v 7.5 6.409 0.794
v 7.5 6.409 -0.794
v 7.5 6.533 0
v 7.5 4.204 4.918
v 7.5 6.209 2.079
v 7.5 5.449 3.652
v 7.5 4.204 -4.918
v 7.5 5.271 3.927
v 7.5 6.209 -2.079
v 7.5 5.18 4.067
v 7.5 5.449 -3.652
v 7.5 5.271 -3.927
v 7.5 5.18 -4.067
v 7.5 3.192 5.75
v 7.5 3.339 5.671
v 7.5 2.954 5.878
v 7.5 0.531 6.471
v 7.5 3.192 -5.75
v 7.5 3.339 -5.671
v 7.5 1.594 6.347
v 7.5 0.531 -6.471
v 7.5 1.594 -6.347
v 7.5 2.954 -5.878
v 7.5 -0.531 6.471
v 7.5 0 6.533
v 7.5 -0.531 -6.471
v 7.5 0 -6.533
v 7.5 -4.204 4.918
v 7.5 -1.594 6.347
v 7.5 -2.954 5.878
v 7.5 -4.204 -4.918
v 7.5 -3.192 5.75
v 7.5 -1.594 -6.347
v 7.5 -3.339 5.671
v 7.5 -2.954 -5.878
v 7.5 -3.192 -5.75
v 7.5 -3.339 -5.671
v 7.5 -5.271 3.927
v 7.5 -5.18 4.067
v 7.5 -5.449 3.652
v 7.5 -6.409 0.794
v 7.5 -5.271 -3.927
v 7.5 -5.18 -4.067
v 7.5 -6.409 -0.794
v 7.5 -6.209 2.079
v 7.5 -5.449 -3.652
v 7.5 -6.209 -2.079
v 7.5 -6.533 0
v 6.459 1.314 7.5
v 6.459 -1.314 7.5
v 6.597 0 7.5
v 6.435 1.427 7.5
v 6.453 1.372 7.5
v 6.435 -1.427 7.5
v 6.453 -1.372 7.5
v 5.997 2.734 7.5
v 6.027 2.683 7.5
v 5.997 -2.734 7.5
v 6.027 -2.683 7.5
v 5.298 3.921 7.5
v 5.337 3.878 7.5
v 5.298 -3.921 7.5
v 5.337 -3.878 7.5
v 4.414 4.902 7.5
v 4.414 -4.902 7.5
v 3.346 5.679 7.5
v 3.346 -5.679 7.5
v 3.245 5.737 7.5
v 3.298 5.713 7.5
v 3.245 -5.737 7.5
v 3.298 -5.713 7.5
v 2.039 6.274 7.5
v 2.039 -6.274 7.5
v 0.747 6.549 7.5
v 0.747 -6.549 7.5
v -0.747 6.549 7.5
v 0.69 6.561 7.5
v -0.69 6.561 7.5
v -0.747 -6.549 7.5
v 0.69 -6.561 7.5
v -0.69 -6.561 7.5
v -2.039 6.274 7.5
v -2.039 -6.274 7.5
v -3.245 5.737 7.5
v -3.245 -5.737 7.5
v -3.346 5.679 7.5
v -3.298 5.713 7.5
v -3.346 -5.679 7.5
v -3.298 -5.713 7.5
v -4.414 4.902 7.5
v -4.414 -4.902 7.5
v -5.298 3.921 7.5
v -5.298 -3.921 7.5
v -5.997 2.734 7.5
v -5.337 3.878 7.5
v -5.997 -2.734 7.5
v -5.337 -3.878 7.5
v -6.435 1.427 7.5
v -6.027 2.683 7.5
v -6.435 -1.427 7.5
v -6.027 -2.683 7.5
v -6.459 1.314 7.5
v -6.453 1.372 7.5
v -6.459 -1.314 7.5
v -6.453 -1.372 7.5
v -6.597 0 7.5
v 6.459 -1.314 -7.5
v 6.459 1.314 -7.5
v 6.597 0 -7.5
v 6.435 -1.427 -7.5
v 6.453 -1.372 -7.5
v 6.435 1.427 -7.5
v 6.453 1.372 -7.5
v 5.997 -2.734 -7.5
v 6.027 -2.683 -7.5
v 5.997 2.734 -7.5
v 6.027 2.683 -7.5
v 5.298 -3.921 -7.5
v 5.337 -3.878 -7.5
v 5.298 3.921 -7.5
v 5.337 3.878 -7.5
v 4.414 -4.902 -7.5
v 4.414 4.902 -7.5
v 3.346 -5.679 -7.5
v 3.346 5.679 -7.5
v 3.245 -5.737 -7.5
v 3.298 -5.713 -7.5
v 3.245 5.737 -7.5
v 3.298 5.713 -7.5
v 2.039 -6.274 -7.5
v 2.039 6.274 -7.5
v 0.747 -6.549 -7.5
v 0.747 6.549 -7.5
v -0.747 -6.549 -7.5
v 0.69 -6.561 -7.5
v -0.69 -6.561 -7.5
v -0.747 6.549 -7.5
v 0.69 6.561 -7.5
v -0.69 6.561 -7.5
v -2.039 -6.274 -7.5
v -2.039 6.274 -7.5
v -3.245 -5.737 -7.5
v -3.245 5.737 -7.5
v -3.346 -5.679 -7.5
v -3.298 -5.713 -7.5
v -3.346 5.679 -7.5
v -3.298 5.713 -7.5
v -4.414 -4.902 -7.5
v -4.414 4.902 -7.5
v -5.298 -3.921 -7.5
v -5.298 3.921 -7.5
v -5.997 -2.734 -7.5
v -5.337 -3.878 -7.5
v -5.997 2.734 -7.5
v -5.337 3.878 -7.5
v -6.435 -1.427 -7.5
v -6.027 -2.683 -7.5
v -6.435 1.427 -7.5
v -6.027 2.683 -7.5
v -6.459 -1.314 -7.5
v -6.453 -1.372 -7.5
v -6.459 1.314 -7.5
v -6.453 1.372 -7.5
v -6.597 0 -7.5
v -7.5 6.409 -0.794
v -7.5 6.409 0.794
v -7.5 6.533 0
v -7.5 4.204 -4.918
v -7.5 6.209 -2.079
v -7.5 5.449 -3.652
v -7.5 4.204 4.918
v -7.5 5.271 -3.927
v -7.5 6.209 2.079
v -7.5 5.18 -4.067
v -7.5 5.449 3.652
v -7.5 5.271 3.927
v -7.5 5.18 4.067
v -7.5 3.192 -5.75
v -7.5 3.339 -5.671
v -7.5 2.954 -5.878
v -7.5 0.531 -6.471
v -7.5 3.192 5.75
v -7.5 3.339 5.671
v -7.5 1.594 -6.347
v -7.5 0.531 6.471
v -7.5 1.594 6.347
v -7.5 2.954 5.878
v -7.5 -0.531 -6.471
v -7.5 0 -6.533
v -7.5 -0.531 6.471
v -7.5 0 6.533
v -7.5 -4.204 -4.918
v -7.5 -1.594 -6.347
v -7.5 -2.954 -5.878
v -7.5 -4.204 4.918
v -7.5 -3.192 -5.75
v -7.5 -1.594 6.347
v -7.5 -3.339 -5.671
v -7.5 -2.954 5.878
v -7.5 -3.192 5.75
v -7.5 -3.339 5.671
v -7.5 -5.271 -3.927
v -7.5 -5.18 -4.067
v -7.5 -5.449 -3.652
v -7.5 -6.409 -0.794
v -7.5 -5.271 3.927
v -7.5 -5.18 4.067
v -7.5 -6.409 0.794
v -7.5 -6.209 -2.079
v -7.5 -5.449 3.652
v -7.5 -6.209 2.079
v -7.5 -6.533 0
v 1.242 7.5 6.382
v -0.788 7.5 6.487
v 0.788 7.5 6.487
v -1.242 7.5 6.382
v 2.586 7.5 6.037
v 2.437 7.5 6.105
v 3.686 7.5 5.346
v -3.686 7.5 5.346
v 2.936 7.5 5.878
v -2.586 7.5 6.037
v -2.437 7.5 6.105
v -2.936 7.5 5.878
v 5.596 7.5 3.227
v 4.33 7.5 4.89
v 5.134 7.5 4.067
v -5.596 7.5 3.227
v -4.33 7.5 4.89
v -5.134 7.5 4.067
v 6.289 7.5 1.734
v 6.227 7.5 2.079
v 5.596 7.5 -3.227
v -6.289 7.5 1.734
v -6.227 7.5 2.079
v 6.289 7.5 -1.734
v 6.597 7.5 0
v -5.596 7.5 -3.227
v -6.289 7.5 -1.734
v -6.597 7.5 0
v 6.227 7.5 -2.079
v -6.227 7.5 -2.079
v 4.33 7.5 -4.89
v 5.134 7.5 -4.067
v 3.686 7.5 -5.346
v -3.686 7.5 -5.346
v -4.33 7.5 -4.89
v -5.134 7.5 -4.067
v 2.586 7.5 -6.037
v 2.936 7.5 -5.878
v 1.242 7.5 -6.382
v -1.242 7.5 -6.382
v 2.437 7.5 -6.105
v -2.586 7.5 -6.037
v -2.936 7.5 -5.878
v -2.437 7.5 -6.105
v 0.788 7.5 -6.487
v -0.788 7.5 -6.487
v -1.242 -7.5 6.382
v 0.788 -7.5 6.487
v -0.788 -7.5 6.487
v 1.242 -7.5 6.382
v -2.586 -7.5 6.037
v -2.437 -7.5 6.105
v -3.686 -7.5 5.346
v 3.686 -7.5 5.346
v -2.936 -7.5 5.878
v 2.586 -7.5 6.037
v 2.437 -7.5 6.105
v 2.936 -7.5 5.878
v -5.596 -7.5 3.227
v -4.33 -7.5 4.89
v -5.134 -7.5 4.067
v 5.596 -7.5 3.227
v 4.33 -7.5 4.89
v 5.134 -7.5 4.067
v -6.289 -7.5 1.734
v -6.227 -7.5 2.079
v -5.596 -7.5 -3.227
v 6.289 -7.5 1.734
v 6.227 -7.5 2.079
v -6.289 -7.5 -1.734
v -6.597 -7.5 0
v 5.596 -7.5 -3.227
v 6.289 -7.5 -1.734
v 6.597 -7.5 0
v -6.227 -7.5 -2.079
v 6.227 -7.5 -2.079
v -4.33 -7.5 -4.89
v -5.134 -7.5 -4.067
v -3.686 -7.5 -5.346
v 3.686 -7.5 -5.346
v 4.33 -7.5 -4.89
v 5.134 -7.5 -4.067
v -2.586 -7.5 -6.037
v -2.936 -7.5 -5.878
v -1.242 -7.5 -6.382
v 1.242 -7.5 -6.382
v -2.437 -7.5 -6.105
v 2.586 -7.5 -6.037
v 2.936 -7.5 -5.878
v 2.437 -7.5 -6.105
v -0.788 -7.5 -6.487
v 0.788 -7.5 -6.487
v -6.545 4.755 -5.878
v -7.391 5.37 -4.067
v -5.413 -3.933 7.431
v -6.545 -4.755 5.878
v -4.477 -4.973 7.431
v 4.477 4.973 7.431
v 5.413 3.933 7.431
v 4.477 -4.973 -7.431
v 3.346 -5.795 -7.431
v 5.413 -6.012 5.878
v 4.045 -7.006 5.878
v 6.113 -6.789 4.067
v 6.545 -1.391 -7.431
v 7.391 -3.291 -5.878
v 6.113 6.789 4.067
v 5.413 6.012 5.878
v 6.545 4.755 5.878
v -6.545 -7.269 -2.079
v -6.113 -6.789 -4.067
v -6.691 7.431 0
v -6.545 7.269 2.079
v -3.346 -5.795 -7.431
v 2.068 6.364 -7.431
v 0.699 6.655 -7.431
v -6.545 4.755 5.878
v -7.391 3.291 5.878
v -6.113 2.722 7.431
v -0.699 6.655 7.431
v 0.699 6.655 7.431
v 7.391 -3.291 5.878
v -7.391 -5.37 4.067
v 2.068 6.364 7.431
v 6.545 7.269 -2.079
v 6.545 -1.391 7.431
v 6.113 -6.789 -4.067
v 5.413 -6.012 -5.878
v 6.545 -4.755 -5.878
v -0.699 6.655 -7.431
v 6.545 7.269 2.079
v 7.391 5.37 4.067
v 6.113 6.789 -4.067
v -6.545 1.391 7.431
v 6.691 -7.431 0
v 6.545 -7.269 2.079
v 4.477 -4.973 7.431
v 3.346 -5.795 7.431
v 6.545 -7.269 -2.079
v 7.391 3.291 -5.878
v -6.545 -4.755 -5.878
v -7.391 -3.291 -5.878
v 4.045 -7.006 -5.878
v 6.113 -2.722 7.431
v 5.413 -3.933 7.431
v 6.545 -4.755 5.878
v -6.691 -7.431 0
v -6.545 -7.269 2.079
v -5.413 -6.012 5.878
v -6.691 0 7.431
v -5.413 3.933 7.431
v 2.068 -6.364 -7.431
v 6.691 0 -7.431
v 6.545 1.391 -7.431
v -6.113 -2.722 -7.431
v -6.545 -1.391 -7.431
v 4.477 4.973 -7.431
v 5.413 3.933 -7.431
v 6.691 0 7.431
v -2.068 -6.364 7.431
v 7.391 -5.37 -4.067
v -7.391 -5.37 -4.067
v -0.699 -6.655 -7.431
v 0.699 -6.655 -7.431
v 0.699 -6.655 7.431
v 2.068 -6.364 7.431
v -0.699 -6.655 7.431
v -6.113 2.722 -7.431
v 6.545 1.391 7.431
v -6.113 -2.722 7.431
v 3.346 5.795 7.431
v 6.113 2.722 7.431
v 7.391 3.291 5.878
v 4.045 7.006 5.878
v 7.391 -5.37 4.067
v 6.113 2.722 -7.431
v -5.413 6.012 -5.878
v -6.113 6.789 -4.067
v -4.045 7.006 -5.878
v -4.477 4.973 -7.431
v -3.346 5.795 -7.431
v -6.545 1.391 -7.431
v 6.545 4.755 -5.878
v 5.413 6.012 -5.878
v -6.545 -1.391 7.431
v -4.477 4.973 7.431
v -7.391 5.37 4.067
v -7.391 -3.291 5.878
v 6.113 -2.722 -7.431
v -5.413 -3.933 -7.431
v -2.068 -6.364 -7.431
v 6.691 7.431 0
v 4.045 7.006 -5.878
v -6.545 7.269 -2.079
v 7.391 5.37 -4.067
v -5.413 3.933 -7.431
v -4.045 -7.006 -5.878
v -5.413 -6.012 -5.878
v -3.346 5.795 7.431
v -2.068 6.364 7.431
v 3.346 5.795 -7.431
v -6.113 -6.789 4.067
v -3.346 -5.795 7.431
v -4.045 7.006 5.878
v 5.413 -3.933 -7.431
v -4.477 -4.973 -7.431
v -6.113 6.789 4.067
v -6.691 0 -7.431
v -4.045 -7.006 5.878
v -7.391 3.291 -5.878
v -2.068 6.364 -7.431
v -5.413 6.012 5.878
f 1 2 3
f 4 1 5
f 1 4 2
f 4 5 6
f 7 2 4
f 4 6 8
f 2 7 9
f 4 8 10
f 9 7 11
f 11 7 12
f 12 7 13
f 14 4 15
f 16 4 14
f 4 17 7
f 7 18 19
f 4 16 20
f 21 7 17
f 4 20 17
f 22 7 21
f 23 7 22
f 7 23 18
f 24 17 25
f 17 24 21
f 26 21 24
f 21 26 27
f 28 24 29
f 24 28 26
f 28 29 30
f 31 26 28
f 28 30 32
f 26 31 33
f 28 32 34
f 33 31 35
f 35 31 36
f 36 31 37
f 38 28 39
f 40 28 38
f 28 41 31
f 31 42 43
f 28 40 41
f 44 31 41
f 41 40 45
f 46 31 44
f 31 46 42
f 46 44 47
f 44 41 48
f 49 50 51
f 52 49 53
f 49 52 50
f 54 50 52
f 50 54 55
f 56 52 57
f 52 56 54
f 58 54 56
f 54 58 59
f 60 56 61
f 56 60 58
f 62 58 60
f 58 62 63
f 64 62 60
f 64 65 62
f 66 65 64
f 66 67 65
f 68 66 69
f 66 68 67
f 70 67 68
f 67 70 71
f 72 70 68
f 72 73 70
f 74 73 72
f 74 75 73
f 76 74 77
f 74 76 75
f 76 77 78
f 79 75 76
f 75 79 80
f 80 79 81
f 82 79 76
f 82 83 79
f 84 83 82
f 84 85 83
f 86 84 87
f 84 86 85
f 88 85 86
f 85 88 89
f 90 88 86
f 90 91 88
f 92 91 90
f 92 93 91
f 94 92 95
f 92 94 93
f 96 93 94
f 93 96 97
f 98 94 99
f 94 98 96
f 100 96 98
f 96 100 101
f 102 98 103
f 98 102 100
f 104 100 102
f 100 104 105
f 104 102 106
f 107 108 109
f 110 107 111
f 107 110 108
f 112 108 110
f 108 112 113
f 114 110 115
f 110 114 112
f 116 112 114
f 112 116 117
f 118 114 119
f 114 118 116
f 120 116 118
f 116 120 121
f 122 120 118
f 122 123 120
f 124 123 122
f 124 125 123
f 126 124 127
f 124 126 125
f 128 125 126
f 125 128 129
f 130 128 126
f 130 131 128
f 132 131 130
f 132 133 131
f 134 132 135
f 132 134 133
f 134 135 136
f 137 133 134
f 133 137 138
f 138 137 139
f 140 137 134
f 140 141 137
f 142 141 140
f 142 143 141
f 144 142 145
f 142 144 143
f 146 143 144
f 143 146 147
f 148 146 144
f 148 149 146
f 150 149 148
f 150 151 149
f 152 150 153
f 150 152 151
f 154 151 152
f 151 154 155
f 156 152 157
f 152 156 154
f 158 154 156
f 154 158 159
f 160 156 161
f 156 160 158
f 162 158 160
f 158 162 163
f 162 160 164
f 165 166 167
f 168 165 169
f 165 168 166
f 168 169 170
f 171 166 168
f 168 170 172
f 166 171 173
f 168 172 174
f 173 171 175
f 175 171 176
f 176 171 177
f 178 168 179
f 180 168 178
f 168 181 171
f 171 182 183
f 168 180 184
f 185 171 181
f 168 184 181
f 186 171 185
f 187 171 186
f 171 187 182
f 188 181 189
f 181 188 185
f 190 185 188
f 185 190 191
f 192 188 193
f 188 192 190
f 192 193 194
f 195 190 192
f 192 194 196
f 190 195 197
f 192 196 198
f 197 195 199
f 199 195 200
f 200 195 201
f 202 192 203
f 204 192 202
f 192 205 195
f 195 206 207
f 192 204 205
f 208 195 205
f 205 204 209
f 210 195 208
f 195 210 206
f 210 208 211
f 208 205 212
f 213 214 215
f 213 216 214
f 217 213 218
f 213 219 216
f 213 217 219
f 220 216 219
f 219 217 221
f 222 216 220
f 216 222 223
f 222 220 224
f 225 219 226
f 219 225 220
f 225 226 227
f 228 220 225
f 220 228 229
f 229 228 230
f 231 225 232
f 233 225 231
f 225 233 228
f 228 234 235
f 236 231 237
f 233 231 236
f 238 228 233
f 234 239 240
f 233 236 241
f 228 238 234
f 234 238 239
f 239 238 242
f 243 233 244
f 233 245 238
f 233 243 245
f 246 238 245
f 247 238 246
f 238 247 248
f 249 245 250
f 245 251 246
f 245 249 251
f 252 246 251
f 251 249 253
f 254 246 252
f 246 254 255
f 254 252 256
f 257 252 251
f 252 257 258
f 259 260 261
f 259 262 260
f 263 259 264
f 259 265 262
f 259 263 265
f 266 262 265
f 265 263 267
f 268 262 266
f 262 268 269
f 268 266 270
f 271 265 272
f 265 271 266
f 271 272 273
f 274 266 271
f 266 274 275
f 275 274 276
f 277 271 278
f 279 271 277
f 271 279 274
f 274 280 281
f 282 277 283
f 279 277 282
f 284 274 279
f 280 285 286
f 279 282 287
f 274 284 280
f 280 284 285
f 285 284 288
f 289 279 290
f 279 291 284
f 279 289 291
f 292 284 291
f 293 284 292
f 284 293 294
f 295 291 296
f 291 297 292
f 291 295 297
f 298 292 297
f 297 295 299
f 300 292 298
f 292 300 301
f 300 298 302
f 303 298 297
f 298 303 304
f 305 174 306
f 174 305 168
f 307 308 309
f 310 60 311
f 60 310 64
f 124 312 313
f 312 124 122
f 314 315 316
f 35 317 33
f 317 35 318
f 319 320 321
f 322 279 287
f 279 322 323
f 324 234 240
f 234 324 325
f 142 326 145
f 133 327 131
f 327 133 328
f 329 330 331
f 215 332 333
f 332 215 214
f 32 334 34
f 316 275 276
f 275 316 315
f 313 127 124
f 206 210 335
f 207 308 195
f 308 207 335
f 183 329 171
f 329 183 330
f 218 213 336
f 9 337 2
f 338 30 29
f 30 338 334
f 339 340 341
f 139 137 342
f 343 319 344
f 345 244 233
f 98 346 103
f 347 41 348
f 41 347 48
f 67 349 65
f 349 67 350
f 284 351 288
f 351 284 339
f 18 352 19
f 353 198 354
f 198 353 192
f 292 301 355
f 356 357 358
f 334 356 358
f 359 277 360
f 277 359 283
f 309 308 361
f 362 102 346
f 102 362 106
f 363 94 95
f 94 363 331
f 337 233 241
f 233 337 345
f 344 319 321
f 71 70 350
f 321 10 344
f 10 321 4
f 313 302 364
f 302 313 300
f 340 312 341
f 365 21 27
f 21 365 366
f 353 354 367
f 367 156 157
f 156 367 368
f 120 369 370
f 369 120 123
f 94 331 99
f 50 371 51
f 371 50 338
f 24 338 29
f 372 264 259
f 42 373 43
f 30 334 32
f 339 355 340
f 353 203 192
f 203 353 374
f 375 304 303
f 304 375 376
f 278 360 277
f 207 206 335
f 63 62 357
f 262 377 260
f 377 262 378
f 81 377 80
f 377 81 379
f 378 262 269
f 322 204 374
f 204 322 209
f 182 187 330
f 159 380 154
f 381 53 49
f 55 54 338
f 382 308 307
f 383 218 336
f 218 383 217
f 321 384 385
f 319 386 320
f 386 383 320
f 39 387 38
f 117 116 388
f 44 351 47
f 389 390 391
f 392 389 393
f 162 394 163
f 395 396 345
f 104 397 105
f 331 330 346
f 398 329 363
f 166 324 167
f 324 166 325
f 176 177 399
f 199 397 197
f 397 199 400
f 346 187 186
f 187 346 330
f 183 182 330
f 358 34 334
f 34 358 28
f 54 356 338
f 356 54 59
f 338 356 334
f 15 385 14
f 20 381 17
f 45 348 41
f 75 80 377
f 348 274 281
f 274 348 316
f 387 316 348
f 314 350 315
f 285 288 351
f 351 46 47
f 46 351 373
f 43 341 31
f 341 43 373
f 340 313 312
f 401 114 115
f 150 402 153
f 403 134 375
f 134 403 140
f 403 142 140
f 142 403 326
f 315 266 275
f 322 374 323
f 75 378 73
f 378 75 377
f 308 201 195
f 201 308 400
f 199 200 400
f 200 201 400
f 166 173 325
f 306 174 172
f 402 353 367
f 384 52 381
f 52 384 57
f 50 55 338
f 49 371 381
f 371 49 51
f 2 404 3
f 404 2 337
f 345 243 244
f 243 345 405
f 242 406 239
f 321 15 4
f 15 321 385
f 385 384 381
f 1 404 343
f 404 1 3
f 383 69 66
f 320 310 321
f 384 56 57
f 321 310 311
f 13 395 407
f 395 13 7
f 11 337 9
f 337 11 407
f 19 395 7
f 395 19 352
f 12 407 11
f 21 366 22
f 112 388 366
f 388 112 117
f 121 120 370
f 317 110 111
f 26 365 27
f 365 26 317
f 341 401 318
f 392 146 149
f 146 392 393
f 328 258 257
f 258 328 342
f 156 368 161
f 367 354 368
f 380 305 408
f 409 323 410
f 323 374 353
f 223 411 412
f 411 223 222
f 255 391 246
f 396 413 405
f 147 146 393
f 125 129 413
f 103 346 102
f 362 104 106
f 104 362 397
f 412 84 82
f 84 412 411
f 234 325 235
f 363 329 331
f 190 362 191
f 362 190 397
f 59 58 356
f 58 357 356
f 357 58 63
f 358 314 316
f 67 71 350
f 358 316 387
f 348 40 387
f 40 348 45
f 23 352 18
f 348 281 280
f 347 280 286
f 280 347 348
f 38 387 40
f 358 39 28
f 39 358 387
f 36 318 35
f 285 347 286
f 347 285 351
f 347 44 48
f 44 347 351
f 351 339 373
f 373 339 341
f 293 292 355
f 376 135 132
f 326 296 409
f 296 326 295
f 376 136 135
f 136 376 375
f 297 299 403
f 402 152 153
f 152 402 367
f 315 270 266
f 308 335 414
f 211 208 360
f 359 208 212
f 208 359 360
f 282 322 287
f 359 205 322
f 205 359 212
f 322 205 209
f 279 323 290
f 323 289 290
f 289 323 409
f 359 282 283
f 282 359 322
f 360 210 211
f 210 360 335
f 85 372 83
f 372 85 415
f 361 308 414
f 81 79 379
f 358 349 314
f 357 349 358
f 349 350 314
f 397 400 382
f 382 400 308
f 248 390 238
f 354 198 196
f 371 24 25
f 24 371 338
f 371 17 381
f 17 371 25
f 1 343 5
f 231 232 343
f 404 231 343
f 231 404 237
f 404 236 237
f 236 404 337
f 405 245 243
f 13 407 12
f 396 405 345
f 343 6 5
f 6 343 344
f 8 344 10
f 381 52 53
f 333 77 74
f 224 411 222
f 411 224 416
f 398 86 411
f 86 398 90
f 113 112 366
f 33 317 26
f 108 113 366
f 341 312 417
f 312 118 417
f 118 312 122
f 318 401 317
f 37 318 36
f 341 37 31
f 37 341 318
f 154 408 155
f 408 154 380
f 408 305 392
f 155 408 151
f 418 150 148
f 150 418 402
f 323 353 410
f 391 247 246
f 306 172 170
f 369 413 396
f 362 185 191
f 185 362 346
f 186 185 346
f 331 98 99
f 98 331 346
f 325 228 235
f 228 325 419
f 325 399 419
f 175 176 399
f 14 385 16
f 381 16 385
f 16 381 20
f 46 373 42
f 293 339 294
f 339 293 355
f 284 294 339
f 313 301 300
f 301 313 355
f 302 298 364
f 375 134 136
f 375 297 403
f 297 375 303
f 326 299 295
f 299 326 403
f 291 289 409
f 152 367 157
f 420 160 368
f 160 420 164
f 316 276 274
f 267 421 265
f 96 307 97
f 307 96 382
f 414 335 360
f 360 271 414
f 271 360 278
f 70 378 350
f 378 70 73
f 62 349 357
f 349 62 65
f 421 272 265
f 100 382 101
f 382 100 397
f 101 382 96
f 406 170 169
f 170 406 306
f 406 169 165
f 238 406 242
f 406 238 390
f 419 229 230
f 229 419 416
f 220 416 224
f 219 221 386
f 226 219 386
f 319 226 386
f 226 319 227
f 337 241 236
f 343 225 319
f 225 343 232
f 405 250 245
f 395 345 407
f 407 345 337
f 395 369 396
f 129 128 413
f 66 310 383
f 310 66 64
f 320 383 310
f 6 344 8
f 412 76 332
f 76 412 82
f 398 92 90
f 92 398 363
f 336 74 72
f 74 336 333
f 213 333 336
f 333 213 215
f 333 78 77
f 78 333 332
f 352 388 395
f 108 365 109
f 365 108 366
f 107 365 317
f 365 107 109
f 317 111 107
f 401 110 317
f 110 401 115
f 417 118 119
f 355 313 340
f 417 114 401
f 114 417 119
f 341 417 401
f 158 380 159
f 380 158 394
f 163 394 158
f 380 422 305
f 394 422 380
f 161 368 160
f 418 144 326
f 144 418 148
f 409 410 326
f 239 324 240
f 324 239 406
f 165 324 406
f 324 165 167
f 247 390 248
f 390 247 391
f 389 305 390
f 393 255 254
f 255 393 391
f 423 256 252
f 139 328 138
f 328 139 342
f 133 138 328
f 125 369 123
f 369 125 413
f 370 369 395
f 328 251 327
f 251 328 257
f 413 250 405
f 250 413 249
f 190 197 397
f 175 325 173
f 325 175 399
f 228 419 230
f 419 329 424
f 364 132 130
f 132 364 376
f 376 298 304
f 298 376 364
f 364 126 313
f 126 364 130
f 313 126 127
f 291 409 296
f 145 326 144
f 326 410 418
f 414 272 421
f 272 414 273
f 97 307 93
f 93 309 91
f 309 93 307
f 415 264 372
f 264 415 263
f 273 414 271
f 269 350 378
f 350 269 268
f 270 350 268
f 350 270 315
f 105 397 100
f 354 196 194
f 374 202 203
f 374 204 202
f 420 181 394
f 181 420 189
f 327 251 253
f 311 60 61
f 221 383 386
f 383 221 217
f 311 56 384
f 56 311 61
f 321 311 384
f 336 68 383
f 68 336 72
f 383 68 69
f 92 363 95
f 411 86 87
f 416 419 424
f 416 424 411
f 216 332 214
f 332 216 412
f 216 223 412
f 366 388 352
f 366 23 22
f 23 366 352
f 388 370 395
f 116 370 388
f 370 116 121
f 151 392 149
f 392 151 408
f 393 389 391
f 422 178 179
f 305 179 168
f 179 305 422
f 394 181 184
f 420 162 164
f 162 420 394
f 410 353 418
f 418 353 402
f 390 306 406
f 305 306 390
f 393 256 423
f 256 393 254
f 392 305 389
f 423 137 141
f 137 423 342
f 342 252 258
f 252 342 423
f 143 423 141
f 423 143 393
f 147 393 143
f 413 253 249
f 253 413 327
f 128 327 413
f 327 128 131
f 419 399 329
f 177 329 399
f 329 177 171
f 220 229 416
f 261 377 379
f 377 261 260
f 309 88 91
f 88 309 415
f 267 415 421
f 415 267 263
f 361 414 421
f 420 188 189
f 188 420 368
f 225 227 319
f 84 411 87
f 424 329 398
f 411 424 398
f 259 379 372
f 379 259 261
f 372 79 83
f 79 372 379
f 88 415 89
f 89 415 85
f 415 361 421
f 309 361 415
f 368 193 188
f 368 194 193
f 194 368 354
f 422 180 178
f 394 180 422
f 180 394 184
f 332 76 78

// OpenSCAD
//Cube Size
cubeSize = 15;//[5,10,15,20,25]

//Shere Size
sphereSize = 10;//[5:20]

intersection() {
    cube(cubeSize, center=true);
    sphere(sphereSize);
}




